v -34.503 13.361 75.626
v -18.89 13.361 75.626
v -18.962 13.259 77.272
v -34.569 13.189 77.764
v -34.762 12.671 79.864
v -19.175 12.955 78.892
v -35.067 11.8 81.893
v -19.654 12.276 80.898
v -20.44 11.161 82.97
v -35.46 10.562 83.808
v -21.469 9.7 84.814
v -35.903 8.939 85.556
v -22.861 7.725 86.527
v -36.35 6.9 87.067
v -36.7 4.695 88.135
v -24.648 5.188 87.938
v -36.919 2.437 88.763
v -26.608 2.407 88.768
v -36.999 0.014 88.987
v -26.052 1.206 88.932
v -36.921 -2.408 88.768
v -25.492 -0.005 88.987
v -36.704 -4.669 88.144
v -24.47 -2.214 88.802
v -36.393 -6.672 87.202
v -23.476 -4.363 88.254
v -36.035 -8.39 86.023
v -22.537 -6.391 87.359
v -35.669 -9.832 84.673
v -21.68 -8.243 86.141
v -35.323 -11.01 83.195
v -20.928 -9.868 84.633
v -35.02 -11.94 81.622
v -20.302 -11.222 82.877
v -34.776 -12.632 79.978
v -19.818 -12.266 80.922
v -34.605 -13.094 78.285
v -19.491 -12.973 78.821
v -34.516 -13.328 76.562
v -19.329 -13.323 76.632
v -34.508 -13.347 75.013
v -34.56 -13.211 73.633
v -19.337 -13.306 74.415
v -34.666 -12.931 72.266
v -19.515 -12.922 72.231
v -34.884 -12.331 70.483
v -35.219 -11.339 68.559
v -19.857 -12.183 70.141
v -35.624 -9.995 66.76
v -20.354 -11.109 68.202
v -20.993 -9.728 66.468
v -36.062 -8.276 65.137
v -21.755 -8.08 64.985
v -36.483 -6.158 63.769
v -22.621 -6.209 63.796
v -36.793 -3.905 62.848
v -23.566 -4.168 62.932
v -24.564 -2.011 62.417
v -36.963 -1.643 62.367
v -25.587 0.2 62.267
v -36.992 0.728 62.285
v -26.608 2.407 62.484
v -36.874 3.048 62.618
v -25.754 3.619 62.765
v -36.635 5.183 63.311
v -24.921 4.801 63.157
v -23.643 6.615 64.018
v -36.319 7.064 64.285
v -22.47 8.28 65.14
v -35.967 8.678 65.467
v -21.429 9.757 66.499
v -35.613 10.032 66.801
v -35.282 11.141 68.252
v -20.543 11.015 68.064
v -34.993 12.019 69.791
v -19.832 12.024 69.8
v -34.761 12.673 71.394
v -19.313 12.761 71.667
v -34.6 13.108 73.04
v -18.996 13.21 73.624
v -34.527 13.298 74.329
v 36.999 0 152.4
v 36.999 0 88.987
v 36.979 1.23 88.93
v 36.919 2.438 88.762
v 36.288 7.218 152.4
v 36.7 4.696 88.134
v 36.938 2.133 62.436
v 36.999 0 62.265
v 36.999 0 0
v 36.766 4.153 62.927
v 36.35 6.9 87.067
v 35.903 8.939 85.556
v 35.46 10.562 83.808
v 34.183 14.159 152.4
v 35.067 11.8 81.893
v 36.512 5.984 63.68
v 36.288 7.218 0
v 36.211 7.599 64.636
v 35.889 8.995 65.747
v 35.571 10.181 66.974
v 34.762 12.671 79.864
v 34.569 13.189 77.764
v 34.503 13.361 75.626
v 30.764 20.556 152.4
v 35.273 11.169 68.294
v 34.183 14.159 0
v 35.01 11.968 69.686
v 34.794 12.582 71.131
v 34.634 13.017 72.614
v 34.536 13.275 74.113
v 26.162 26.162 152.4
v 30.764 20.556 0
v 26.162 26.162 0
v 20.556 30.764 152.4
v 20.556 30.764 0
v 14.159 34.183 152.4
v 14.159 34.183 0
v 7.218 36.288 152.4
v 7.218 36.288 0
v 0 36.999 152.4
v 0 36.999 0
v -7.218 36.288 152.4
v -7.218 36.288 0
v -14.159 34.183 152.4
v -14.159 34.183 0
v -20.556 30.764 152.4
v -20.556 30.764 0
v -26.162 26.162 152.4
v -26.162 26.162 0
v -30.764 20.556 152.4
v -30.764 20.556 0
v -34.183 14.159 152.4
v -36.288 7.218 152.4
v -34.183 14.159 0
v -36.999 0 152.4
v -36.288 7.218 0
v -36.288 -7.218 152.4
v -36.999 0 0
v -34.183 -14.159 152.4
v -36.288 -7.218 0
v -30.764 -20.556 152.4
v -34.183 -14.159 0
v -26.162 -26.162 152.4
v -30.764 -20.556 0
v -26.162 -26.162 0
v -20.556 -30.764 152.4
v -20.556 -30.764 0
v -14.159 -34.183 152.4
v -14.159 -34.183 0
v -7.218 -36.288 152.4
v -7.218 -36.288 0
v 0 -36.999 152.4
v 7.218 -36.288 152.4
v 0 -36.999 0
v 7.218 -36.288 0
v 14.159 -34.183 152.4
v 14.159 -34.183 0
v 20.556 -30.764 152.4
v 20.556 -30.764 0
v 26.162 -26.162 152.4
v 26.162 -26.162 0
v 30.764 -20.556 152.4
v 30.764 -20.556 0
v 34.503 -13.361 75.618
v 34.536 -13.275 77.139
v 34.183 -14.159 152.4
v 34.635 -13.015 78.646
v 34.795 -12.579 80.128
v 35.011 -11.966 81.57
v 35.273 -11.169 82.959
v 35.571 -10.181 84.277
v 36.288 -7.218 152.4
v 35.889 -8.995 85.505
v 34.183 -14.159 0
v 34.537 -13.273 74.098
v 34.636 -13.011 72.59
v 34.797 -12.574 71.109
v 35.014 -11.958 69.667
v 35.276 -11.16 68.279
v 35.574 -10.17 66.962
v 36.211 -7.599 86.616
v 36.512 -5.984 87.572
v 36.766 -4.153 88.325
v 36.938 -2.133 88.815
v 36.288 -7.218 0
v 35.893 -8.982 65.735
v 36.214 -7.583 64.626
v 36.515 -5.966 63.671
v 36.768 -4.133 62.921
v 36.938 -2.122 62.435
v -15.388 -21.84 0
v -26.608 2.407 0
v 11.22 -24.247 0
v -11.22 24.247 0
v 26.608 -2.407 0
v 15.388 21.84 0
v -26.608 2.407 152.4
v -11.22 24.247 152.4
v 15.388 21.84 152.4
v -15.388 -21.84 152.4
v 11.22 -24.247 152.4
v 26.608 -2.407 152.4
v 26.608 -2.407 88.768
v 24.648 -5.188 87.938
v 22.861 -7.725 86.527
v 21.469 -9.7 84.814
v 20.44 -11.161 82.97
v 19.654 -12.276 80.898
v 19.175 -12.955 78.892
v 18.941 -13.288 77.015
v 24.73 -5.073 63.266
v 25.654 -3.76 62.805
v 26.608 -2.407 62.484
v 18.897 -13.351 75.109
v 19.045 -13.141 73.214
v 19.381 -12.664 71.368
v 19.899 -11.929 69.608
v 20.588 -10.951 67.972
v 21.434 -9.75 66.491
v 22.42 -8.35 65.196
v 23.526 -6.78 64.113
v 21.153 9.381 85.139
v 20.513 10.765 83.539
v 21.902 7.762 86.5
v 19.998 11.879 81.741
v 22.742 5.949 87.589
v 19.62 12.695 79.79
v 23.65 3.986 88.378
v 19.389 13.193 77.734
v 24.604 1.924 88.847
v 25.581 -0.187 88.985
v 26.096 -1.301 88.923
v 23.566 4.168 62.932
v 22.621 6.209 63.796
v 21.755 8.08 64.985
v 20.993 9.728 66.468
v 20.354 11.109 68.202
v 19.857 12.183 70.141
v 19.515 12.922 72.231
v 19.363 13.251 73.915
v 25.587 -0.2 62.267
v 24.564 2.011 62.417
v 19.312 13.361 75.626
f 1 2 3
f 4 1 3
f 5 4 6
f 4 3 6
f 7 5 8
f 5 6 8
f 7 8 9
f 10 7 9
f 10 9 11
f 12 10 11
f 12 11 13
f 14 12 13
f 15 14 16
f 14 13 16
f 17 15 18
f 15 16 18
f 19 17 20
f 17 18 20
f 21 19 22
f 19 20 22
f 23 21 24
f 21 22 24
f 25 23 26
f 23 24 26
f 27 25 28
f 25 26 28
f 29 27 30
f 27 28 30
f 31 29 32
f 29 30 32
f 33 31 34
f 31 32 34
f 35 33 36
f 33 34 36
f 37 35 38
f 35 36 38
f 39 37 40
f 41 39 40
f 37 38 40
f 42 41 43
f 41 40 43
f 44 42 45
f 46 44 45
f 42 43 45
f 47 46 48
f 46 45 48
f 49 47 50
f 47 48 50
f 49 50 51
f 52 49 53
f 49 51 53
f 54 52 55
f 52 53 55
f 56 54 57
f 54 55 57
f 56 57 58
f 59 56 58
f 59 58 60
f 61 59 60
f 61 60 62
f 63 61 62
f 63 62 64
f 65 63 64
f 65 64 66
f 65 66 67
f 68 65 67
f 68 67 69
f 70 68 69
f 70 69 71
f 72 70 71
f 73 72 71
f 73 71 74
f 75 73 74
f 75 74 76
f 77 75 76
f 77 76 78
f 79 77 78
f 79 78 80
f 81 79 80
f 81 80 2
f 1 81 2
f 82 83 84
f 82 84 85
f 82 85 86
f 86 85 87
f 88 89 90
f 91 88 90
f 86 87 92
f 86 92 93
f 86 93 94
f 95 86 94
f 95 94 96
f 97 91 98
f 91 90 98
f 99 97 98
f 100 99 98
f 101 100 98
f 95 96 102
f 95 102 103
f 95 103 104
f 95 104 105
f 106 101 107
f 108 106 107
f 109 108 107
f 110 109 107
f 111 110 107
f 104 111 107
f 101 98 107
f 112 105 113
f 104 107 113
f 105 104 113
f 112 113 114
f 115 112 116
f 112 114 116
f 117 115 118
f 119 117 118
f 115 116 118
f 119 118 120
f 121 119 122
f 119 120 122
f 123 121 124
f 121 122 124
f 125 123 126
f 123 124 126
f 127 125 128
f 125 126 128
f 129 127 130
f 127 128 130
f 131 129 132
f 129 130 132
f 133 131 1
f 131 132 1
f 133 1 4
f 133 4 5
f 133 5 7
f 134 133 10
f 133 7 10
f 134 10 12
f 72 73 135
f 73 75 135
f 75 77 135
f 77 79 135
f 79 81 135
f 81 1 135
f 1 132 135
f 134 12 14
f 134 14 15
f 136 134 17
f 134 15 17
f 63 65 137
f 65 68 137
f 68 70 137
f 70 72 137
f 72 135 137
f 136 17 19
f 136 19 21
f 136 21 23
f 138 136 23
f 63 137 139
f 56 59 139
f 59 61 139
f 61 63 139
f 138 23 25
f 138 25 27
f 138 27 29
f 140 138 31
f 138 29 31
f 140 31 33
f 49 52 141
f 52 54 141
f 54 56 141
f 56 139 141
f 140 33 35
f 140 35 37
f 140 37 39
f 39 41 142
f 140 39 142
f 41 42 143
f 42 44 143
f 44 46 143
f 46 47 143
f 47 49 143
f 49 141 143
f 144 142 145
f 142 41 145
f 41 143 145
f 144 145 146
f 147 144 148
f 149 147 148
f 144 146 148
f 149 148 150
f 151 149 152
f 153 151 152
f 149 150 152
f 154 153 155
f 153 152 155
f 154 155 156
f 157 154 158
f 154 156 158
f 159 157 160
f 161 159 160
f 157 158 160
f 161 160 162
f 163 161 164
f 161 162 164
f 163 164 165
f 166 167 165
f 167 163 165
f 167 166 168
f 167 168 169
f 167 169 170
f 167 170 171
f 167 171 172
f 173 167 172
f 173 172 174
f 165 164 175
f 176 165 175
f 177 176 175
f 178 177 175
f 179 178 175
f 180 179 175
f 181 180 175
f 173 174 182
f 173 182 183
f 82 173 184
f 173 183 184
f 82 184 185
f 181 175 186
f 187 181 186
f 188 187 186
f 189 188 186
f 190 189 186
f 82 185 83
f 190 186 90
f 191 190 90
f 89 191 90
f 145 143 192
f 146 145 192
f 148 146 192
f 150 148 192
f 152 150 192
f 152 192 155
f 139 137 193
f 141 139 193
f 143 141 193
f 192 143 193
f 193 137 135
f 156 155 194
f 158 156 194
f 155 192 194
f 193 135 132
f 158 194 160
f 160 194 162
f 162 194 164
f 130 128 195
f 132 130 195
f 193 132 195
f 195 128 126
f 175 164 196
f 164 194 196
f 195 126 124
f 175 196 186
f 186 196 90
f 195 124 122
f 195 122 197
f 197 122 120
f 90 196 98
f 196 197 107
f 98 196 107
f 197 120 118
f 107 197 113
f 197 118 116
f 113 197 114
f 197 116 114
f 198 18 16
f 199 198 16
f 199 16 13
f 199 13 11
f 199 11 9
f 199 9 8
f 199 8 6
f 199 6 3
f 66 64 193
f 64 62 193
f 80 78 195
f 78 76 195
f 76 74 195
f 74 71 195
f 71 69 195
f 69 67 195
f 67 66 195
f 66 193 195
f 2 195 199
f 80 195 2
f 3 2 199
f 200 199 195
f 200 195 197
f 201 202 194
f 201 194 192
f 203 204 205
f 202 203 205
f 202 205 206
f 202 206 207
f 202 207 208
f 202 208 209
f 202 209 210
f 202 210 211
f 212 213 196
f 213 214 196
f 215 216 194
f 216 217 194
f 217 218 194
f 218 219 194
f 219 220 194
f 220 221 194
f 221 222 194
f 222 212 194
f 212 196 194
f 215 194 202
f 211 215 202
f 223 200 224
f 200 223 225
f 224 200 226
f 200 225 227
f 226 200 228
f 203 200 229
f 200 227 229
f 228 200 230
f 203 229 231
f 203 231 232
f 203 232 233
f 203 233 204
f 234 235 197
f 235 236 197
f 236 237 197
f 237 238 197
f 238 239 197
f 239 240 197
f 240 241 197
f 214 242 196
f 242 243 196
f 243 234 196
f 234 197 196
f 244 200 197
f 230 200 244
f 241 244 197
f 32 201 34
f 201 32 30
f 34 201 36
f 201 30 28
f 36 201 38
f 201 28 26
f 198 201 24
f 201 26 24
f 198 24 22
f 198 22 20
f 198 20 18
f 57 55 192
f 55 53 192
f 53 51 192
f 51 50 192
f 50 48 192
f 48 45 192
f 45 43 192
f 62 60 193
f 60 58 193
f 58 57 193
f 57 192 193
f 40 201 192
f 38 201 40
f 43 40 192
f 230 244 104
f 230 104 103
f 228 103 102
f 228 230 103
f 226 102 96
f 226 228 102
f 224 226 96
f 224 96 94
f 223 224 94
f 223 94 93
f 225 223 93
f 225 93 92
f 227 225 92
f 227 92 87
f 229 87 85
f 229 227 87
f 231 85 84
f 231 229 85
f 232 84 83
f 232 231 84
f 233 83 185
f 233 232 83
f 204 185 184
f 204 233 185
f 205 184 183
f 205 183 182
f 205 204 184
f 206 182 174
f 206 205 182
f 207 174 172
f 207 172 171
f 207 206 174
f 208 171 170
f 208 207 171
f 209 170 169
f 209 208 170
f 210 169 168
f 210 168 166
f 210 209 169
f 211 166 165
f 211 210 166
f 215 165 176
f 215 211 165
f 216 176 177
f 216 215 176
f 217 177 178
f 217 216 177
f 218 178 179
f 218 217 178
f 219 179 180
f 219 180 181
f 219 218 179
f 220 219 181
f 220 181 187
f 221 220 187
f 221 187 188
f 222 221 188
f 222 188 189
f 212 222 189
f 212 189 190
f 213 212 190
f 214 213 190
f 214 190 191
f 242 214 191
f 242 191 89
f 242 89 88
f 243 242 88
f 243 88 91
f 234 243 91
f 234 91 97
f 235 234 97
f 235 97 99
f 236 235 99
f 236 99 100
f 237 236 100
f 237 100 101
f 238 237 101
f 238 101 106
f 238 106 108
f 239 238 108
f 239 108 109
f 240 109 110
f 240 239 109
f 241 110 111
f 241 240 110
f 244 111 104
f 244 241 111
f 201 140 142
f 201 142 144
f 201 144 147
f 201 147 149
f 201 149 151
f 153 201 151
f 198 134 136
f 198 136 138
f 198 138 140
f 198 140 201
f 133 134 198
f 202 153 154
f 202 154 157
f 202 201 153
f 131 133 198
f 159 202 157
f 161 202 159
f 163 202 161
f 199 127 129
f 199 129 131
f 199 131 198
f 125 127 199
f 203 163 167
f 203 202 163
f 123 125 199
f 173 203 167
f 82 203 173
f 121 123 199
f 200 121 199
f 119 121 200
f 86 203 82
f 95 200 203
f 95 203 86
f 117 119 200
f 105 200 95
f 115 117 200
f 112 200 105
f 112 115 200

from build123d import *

# Parameters (mm, degrees)
F0_R          = 36.999362
F1_DEPTH      = 152.4
F2_R          = 13.360744
F3_DEPTH      = 228.6
F3_DEPTH_BACK = 228.6


with BuildPart() as f1:
    # F0 (on Top) → F1 (new body)
    with BuildSketch(Plane.XY):
        Circle(F0_R)
        Polygon((11.219716, -24.246573), (-15.38829, -21.839846), (-26.608006, 2.406727), (-11.219716, 24.246573), (15.38829, 21.839846), (26.608006, -2.406727), align=None, mode=Mode.SUBTRACT)
    extrude(amount=F1_DEPTH)

    # F2 (on Right) → F3 (cut, two sides)
    with BuildSketch(Plane.YZ) as f3_sk:
        with Locations((0, 75.625911)):
            Circle(F2_R)
    extrude(amount=F3_DEPTH, mode=Mode.SUBTRACT)
    extrude(f3_sk.sketch, amount=-F3_DEPTH_BACK, mode=Mode.SUBTRACT)


solid = f1.part
